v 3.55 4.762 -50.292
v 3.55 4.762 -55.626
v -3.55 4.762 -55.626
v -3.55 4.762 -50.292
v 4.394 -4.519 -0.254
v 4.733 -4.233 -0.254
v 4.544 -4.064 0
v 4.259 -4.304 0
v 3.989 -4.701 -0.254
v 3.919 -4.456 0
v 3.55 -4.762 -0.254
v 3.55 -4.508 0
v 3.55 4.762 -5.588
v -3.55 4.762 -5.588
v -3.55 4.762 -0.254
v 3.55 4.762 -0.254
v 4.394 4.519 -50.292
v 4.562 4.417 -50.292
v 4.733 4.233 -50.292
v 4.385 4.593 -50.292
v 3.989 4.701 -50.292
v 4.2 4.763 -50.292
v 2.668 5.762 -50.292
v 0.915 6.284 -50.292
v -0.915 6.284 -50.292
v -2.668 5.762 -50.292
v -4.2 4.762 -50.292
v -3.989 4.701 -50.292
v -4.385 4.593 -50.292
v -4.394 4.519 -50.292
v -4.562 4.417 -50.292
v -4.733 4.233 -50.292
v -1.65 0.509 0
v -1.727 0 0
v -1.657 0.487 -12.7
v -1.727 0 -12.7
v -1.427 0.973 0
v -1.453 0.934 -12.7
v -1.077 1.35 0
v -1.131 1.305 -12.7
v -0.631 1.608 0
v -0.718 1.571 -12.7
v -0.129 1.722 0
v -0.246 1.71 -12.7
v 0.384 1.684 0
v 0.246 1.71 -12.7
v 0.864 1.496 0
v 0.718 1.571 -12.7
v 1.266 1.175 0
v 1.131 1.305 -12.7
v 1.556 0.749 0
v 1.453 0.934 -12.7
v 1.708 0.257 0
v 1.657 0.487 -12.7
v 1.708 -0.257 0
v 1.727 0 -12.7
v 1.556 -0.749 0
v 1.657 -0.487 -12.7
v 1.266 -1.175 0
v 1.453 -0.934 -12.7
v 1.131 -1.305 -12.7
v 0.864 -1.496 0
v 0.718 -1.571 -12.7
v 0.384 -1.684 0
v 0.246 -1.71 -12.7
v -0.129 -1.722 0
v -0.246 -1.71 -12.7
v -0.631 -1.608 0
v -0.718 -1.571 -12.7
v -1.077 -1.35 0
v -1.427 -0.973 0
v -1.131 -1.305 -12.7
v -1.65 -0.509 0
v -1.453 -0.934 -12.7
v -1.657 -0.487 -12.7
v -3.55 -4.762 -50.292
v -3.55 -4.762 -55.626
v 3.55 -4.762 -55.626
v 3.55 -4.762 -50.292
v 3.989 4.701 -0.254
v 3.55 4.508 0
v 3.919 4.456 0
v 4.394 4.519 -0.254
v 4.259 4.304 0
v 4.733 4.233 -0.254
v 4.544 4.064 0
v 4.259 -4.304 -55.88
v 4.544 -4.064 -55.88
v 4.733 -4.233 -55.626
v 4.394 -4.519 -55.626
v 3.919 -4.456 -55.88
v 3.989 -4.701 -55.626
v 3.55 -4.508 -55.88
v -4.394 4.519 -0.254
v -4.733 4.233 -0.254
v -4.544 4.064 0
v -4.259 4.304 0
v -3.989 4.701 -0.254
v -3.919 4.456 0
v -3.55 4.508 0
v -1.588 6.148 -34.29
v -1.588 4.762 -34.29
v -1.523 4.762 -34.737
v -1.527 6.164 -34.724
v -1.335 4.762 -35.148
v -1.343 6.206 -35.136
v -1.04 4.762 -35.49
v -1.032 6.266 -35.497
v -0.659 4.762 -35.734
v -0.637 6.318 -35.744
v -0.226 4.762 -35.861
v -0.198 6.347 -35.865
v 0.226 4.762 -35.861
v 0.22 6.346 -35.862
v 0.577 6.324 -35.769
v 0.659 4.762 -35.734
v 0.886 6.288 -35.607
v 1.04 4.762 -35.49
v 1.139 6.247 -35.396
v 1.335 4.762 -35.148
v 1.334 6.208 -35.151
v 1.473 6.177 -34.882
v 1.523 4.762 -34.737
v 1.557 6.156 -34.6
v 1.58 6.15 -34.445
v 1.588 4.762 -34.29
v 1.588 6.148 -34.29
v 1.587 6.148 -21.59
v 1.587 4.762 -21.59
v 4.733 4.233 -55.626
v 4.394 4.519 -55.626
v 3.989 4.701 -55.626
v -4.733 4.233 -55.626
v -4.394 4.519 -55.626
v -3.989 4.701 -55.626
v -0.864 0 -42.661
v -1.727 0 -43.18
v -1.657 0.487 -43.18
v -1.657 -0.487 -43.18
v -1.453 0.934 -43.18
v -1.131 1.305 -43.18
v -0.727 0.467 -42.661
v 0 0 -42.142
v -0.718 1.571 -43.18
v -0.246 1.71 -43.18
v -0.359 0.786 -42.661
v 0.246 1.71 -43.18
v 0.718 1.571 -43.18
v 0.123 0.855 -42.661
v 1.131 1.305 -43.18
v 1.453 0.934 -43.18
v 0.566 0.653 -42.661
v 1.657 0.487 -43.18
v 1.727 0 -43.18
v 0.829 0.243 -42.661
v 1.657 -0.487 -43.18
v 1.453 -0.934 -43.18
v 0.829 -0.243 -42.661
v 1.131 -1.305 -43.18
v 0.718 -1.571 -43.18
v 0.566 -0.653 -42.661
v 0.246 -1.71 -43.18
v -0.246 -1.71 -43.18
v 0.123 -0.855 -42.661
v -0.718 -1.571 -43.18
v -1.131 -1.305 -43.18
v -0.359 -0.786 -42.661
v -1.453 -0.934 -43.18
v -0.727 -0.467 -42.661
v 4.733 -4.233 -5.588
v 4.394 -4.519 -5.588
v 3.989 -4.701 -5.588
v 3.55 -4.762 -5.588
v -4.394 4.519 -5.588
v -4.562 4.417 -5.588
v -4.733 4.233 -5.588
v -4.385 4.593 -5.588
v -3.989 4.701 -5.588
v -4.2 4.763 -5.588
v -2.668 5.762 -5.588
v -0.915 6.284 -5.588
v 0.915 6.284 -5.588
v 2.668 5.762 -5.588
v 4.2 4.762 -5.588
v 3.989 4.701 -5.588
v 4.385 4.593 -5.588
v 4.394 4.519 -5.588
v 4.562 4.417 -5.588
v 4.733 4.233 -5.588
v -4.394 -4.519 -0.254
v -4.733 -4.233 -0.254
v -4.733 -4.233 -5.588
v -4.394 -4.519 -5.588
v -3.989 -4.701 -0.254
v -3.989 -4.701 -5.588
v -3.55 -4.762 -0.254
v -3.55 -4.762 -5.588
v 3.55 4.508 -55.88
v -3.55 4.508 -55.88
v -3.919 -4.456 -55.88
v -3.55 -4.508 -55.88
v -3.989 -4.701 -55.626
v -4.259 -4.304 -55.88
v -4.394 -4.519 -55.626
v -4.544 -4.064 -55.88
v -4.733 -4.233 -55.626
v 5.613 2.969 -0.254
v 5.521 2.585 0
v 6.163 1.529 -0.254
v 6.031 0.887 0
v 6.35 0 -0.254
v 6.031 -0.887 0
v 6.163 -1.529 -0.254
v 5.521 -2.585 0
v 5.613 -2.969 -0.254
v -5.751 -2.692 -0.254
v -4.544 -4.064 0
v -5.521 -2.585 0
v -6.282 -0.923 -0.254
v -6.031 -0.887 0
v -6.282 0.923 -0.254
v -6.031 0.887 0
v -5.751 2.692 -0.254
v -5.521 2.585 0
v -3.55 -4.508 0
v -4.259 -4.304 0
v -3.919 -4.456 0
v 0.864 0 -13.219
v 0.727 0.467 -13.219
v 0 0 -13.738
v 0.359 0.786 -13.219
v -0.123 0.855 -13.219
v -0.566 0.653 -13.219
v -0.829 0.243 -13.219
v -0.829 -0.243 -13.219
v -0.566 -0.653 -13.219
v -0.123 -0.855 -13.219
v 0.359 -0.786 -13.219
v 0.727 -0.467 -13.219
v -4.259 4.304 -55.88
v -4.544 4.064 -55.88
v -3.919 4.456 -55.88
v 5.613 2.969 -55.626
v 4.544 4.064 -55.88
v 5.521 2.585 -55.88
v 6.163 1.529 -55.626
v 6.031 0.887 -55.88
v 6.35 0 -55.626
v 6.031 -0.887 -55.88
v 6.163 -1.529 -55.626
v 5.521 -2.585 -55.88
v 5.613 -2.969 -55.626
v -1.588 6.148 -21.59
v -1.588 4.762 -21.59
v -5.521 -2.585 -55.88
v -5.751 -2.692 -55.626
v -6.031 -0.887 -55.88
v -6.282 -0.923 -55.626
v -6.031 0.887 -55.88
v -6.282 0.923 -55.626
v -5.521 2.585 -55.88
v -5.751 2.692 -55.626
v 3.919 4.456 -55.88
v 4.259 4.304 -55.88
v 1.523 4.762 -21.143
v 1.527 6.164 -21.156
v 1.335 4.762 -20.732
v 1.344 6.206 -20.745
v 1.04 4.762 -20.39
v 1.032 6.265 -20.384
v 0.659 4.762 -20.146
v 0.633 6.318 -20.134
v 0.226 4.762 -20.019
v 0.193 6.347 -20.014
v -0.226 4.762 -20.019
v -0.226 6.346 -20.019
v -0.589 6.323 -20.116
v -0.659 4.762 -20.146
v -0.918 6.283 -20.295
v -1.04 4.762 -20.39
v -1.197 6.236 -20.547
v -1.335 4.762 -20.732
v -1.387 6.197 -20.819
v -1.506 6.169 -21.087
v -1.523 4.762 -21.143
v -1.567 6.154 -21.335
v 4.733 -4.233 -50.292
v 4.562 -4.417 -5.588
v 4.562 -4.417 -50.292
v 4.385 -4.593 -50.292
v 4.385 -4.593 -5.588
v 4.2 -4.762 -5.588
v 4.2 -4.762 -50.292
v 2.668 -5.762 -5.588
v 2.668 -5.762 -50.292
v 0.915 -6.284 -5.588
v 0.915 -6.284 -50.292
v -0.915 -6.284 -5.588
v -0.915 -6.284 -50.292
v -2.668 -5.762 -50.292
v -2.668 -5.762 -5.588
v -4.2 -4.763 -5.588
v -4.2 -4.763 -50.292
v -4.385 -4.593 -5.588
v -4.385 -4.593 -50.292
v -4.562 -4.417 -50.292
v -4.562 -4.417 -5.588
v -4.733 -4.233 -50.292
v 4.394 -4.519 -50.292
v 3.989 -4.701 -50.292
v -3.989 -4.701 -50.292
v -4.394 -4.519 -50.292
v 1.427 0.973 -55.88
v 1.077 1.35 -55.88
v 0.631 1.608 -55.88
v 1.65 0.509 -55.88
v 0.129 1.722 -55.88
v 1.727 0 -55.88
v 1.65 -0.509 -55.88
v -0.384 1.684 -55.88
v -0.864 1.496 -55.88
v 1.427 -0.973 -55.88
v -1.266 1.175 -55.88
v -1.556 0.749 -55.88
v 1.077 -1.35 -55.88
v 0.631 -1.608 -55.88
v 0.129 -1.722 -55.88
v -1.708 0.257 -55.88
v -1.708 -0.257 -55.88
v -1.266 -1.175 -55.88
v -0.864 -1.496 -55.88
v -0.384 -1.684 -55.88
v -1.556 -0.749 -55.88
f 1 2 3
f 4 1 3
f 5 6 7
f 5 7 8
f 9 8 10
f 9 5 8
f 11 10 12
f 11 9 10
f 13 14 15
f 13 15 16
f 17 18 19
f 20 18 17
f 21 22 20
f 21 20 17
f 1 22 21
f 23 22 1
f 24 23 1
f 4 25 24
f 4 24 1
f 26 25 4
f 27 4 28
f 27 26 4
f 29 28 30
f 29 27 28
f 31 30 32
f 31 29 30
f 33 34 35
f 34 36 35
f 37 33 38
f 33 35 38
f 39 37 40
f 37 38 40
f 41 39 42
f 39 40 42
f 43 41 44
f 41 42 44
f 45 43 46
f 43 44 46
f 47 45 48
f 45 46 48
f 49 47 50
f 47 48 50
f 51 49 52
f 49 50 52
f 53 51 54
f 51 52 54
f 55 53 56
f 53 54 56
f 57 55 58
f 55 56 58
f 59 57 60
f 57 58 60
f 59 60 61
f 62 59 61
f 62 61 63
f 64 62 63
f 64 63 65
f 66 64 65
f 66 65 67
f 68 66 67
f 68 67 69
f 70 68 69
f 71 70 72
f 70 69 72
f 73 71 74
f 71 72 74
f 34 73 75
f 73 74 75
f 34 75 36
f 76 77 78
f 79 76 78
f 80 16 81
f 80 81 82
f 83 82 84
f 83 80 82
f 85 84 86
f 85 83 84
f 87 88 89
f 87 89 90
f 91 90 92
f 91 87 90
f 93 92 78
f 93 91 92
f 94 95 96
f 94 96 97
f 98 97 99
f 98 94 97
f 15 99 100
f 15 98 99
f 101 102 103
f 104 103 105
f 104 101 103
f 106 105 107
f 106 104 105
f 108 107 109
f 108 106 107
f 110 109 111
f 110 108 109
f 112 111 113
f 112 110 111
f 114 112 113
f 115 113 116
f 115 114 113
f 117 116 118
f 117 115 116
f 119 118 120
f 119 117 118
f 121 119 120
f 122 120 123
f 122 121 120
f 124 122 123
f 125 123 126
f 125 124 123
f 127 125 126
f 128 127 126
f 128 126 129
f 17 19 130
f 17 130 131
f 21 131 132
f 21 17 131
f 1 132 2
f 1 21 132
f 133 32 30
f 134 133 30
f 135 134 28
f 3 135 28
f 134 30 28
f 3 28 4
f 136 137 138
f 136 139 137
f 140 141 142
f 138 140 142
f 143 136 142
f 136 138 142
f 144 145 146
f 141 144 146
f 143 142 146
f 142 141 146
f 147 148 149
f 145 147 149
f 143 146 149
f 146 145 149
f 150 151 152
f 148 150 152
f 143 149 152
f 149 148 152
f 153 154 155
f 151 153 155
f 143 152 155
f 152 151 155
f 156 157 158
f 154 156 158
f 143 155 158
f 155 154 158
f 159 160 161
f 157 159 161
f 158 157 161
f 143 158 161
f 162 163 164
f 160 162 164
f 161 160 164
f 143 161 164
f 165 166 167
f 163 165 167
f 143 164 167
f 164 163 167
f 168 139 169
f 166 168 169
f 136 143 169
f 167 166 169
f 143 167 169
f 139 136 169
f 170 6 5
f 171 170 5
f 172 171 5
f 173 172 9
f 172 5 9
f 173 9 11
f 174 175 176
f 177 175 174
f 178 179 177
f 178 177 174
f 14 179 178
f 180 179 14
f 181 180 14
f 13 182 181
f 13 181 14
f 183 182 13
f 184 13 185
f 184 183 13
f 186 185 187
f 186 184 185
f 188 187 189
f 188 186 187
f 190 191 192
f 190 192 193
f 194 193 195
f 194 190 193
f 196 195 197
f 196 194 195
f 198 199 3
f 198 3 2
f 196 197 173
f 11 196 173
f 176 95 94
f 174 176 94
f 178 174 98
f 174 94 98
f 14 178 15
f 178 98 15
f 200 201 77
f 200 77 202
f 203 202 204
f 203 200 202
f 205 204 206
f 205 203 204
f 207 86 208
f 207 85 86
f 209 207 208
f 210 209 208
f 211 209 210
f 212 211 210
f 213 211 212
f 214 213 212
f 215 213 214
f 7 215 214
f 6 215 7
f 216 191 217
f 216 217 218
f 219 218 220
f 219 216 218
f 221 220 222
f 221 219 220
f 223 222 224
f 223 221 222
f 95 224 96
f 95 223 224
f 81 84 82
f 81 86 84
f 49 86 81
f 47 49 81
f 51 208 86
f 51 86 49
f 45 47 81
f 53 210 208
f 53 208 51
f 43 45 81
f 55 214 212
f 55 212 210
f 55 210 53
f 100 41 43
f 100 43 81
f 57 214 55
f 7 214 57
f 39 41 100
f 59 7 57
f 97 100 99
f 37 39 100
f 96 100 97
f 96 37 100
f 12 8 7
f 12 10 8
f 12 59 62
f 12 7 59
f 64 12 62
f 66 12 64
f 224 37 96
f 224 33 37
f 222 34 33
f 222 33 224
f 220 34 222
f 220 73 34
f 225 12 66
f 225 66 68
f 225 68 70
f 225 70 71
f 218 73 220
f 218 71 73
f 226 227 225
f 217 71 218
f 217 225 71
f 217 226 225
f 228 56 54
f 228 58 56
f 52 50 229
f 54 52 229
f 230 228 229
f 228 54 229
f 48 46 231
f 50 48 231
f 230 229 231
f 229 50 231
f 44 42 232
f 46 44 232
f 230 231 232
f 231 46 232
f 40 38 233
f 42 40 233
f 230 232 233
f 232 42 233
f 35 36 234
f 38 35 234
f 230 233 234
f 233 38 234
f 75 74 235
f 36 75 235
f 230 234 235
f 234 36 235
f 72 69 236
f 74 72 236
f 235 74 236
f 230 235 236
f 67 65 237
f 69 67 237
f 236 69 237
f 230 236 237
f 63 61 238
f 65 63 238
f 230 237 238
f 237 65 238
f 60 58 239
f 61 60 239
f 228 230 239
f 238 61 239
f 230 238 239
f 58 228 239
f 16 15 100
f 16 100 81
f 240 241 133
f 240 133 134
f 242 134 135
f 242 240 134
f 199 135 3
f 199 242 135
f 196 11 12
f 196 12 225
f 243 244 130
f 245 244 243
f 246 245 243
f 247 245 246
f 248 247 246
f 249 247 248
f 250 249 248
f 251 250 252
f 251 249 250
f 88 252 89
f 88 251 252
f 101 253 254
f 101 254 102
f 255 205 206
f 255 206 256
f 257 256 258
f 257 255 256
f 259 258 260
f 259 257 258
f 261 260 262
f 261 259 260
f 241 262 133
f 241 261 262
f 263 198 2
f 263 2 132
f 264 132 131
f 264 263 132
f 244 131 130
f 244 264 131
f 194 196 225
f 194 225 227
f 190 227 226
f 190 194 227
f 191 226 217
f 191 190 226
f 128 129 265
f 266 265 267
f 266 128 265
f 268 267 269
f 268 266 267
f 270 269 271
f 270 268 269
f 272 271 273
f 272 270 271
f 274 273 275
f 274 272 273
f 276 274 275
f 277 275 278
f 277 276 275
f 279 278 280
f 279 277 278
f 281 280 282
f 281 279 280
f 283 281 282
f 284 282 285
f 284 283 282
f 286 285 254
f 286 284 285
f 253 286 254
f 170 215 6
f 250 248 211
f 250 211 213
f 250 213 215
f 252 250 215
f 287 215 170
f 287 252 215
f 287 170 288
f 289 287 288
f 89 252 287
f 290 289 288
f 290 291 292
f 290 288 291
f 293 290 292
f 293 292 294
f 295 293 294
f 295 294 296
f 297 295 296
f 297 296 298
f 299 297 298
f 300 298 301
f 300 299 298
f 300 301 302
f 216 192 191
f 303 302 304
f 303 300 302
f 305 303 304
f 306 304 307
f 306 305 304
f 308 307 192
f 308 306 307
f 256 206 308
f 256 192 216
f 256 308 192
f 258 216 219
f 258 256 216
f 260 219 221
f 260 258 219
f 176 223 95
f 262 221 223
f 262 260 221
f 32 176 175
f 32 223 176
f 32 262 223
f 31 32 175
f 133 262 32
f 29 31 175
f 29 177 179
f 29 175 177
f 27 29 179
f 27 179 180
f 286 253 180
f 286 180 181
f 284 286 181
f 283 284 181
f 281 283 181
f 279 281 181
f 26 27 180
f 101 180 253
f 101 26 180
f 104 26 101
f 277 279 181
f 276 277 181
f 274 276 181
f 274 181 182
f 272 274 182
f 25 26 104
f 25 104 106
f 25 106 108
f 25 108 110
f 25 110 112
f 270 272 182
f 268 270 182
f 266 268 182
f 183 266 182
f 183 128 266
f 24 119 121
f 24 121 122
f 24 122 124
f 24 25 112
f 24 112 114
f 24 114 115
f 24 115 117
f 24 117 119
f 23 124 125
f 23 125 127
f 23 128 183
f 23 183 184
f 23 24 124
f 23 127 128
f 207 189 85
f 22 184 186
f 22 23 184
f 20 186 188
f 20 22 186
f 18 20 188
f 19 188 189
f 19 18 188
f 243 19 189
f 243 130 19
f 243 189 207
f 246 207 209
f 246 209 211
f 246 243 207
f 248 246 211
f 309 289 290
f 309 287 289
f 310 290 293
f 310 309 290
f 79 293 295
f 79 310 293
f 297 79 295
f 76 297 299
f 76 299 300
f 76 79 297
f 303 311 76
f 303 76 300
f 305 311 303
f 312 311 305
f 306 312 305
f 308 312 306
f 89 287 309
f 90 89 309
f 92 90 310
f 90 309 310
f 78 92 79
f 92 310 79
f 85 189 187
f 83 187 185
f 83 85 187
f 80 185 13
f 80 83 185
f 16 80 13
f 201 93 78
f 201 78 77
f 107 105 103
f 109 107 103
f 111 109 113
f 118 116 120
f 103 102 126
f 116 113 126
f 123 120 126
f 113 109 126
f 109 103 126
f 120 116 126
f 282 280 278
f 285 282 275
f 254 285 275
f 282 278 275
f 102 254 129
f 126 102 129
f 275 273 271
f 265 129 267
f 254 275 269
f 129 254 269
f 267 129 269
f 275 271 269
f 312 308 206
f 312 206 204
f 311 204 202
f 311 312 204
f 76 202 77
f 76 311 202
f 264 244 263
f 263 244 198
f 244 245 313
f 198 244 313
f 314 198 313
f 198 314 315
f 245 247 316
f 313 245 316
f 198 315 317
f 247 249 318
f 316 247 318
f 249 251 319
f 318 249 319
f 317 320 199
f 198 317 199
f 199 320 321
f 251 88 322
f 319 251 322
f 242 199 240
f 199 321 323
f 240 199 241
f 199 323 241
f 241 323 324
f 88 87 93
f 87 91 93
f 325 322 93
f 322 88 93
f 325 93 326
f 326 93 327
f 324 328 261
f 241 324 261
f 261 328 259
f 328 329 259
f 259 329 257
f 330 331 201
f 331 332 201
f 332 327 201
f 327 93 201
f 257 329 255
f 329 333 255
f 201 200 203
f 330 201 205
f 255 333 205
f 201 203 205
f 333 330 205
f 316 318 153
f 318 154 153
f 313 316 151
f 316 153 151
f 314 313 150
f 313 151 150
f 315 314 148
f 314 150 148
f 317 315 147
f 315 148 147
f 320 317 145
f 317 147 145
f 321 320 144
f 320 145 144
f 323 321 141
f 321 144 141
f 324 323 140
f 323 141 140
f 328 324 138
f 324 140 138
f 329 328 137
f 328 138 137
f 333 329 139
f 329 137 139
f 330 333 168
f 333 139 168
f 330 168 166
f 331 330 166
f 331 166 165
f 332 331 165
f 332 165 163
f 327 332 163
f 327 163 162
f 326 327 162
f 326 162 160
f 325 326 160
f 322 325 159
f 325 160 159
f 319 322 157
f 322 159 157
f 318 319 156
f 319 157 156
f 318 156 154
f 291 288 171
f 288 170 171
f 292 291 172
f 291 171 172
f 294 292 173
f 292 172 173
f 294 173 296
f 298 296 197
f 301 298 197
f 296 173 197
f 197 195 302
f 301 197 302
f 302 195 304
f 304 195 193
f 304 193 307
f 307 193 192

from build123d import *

# Parameters (mm, degrees)
SKETCH1_W                 = 55.88
SKETCH1_H                 = 6.35
CUT_EXTRUDE1_START        = -5.588
CUT_EXTRUDE1_DEPTH        = 5.588
CUT_EXTRUDE2_DEPTH        = 5.588
F_8_32_TAPPED_HOLE1_D     = 3.4544
F_8_32_TAPPED_HOLE1_DEPTH = 12.7
F_8_32_TAPPED_HOLE1_TIP   = 1.037806461
F_8_32_TAPPED_HOLE2_D     = 3.4544
F_8_32_TAPPED_HOLE2_DEPTH = 12.7
F_8_32_TAPPED_HOLE2_TIP   = 1.037806461
FILLET1_R                 = 1.5875
CHAMFER1_SIZE             = 0.254
CUT_EXTRUDE3_DEPTH        = 1.5875


with BuildPart() as part:
    # Sketch1 → Revolve1 (revolve)
    with BuildSketch(Plane(origin=(0, 0, 0), x_dir=(0, 0, -1), z_dir=(1, 0, 0)), mode=Mode.PRIVATE) as revolve1_sk:
        with Locations((27.94, 3.175)):
            Rectangle(SKETCH1_W, SKETCH1_H)
    revolve(revolve1_sk.sketch.rotate(Axis((0, 0, 0), (0, 0, -1)), 90), axis=Axis((0, 0, 0), (0, 0, -1)))

    # Sketch5 → Cut-Extrude1 (cut)
    with BuildSketch(Plane.XY.offset(CUT_EXTRUDE1_START)):
        with BuildLine():
            Line((-4.200130206, 4.7625), (4.200130206, 4.7625))
            ThreePointArc((4.200130206, 4.7625), (0, 6.35), (-4.200130206, 4.7625))
        make_face()
        with BuildLine():
            Line((-4.200130206, -4.7625), (4.200130206, -4.7625))
            ThreePointArc((4.200130206, -4.7625), (0, -6.35), (-4.200130206, -4.7625))
        make_face()
    extrude(amount=CUT_EXTRUDE1_DEPTH, mode=Mode.SUBTRACT)

    # Sketch6 → Cut-Extrude2 (cut)
    with BuildSketch(Plane(origin=(0, 0, -55.88), x_dir=(-1, 0, 0), z_dir=(0, 0, -1))):
        with BuildLine():
            Line((-4.200130206, 4.7625), (4.200130206, 4.7625))
            ThreePointArc((4.200130206, 4.7625), (0, 6.35), (-4.200130206, 4.7625))
        make_face()
        with BuildLine():
            Line((4.200130206, -4.7625), (-4.200130206, -4.7625))
            ThreePointArc((-4.200130206, -4.7625), (0, -6.35), (4.200130206, -4.7625))
        make_face()
    extrude(amount=-CUT_EXTRUDE2_DEPTH, mode=Mode.SUBTRACT)

    # #8-32 Tapped Hole1
    with Locations(Plane.XY):
        with Locations((0, 0)):
            Hole(F_8_32_TAPPED_HOLE1_D / 2, depth=F_8_32_TAPPED_HOLE1_DEPTH)
            with Locations((0, 0, -(F_8_32_TAPPED_HOLE1_DEPTH + F_8_32_TAPPED_HOLE1_TIP / 2))):  # 118° drill point
                Cone(0, F_8_32_TAPPED_HOLE1_D / 2, F_8_32_TAPPED_HOLE1_TIP, mode=Mode.SUBTRACT)

    # #8-32 Tapped Hole2
    with Locations(Plane(origin=(0, 0, -55.88), x_dir=(-1, 0, 0), z_dir=(0, 0, -1))):
        with Locations((0, 0)):
            Hole(F_8_32_TAPPED_HOLE2_D / 2, depth=F_8_32_TAPPED_HOLE2_DEPTH)
            with Locations((0, 0, -(F_8_32_TAPPED_HOLE2_DEPTH + F_8_32_TAPPED_HOLE2_TIP / 2))):  # 118° drill point
                Cone(0, F_8_32_TAPPED_HOLE2_D / 2, F_8_32_TAPPED_HOLE2_TIP, mode=Mode.SUBTRACT)

    # Fillet1
    fillet1_edges = [part.edges().sort_by_distance(p)[0] for p in [
        (-4.200130206, 4.7625, -2.794),
        (4.200130206, 4.7625, -2.794),
        (4.200130206, -4.7625, -2.794),
        (-4.200130206, -4.7625, -2.794),
        (4.200130206, 4.7625, -53.086),
        (-4.200130206, 4.7625, -53.086),
        (-4.200130206, -4.7625, -53.086),
        (4.200130206, -4.7625, -53.086),
    ]]
    fillet(fillet1_edges, radius=FILLET1_R)

    # Chamfer1
    chamfer1_edges = [part.edges().sort_by_distance(p)[0] for p in [
        (-6.35, 0, -55.88),
        (5.931994479, -2.26582027, -55.88),
        (-6.35, 0, 0),
        (5.931994479, -2.26582027, 0),
        (0, -4.7625, 0),
        (0, 4.7625, 0),
        (-4.197852075, 4.6241826, 0),
        (4.197852075, 4.6241826, 0),
        (4.197852075, -4.6241826, 0),
        (-4.197852075, -4.6241826, 0),
        (0, -4.7625, -55.88),
        (0, 4.7625, -55.88),
        (4.197852075, 4.6241826, -55.88),
        (-4.197852075, 4.6241826, -55.88),
        (4.197852075, -4.6241826, -55.88),
        (-4.197852075, -4.6241826, -55.88),
    ]]
    chamfer(chamfer1_edges, length=CHAMFER1_SIZE)

    # Sketch11 → Cut-Extrude3 (cut)
    with BuildSketch(Plane(origin=(0, 6.35, 0), x_dir=(-1, 0, 0), z_dir=(0, 1, 0))):
        with BuildLine():
            Line((-1.5875, -34.29), (-1.5875, -21.59))
            ThreePointArc((-1.5875, -21.59), (0, -20.0025), (1.5875, -21.59))
            Line((1.5875, -21.59), (1.5875, -34.29))
            ThreePointArc((1.5875, -34.29), (0, -35.8775), (-1.5875, -34.29))
        make_face()
    extrude(amount=-CUT_EXTRUDE3_DEPTH, mode=Mode.SUBTRACT)


solid = part.part
